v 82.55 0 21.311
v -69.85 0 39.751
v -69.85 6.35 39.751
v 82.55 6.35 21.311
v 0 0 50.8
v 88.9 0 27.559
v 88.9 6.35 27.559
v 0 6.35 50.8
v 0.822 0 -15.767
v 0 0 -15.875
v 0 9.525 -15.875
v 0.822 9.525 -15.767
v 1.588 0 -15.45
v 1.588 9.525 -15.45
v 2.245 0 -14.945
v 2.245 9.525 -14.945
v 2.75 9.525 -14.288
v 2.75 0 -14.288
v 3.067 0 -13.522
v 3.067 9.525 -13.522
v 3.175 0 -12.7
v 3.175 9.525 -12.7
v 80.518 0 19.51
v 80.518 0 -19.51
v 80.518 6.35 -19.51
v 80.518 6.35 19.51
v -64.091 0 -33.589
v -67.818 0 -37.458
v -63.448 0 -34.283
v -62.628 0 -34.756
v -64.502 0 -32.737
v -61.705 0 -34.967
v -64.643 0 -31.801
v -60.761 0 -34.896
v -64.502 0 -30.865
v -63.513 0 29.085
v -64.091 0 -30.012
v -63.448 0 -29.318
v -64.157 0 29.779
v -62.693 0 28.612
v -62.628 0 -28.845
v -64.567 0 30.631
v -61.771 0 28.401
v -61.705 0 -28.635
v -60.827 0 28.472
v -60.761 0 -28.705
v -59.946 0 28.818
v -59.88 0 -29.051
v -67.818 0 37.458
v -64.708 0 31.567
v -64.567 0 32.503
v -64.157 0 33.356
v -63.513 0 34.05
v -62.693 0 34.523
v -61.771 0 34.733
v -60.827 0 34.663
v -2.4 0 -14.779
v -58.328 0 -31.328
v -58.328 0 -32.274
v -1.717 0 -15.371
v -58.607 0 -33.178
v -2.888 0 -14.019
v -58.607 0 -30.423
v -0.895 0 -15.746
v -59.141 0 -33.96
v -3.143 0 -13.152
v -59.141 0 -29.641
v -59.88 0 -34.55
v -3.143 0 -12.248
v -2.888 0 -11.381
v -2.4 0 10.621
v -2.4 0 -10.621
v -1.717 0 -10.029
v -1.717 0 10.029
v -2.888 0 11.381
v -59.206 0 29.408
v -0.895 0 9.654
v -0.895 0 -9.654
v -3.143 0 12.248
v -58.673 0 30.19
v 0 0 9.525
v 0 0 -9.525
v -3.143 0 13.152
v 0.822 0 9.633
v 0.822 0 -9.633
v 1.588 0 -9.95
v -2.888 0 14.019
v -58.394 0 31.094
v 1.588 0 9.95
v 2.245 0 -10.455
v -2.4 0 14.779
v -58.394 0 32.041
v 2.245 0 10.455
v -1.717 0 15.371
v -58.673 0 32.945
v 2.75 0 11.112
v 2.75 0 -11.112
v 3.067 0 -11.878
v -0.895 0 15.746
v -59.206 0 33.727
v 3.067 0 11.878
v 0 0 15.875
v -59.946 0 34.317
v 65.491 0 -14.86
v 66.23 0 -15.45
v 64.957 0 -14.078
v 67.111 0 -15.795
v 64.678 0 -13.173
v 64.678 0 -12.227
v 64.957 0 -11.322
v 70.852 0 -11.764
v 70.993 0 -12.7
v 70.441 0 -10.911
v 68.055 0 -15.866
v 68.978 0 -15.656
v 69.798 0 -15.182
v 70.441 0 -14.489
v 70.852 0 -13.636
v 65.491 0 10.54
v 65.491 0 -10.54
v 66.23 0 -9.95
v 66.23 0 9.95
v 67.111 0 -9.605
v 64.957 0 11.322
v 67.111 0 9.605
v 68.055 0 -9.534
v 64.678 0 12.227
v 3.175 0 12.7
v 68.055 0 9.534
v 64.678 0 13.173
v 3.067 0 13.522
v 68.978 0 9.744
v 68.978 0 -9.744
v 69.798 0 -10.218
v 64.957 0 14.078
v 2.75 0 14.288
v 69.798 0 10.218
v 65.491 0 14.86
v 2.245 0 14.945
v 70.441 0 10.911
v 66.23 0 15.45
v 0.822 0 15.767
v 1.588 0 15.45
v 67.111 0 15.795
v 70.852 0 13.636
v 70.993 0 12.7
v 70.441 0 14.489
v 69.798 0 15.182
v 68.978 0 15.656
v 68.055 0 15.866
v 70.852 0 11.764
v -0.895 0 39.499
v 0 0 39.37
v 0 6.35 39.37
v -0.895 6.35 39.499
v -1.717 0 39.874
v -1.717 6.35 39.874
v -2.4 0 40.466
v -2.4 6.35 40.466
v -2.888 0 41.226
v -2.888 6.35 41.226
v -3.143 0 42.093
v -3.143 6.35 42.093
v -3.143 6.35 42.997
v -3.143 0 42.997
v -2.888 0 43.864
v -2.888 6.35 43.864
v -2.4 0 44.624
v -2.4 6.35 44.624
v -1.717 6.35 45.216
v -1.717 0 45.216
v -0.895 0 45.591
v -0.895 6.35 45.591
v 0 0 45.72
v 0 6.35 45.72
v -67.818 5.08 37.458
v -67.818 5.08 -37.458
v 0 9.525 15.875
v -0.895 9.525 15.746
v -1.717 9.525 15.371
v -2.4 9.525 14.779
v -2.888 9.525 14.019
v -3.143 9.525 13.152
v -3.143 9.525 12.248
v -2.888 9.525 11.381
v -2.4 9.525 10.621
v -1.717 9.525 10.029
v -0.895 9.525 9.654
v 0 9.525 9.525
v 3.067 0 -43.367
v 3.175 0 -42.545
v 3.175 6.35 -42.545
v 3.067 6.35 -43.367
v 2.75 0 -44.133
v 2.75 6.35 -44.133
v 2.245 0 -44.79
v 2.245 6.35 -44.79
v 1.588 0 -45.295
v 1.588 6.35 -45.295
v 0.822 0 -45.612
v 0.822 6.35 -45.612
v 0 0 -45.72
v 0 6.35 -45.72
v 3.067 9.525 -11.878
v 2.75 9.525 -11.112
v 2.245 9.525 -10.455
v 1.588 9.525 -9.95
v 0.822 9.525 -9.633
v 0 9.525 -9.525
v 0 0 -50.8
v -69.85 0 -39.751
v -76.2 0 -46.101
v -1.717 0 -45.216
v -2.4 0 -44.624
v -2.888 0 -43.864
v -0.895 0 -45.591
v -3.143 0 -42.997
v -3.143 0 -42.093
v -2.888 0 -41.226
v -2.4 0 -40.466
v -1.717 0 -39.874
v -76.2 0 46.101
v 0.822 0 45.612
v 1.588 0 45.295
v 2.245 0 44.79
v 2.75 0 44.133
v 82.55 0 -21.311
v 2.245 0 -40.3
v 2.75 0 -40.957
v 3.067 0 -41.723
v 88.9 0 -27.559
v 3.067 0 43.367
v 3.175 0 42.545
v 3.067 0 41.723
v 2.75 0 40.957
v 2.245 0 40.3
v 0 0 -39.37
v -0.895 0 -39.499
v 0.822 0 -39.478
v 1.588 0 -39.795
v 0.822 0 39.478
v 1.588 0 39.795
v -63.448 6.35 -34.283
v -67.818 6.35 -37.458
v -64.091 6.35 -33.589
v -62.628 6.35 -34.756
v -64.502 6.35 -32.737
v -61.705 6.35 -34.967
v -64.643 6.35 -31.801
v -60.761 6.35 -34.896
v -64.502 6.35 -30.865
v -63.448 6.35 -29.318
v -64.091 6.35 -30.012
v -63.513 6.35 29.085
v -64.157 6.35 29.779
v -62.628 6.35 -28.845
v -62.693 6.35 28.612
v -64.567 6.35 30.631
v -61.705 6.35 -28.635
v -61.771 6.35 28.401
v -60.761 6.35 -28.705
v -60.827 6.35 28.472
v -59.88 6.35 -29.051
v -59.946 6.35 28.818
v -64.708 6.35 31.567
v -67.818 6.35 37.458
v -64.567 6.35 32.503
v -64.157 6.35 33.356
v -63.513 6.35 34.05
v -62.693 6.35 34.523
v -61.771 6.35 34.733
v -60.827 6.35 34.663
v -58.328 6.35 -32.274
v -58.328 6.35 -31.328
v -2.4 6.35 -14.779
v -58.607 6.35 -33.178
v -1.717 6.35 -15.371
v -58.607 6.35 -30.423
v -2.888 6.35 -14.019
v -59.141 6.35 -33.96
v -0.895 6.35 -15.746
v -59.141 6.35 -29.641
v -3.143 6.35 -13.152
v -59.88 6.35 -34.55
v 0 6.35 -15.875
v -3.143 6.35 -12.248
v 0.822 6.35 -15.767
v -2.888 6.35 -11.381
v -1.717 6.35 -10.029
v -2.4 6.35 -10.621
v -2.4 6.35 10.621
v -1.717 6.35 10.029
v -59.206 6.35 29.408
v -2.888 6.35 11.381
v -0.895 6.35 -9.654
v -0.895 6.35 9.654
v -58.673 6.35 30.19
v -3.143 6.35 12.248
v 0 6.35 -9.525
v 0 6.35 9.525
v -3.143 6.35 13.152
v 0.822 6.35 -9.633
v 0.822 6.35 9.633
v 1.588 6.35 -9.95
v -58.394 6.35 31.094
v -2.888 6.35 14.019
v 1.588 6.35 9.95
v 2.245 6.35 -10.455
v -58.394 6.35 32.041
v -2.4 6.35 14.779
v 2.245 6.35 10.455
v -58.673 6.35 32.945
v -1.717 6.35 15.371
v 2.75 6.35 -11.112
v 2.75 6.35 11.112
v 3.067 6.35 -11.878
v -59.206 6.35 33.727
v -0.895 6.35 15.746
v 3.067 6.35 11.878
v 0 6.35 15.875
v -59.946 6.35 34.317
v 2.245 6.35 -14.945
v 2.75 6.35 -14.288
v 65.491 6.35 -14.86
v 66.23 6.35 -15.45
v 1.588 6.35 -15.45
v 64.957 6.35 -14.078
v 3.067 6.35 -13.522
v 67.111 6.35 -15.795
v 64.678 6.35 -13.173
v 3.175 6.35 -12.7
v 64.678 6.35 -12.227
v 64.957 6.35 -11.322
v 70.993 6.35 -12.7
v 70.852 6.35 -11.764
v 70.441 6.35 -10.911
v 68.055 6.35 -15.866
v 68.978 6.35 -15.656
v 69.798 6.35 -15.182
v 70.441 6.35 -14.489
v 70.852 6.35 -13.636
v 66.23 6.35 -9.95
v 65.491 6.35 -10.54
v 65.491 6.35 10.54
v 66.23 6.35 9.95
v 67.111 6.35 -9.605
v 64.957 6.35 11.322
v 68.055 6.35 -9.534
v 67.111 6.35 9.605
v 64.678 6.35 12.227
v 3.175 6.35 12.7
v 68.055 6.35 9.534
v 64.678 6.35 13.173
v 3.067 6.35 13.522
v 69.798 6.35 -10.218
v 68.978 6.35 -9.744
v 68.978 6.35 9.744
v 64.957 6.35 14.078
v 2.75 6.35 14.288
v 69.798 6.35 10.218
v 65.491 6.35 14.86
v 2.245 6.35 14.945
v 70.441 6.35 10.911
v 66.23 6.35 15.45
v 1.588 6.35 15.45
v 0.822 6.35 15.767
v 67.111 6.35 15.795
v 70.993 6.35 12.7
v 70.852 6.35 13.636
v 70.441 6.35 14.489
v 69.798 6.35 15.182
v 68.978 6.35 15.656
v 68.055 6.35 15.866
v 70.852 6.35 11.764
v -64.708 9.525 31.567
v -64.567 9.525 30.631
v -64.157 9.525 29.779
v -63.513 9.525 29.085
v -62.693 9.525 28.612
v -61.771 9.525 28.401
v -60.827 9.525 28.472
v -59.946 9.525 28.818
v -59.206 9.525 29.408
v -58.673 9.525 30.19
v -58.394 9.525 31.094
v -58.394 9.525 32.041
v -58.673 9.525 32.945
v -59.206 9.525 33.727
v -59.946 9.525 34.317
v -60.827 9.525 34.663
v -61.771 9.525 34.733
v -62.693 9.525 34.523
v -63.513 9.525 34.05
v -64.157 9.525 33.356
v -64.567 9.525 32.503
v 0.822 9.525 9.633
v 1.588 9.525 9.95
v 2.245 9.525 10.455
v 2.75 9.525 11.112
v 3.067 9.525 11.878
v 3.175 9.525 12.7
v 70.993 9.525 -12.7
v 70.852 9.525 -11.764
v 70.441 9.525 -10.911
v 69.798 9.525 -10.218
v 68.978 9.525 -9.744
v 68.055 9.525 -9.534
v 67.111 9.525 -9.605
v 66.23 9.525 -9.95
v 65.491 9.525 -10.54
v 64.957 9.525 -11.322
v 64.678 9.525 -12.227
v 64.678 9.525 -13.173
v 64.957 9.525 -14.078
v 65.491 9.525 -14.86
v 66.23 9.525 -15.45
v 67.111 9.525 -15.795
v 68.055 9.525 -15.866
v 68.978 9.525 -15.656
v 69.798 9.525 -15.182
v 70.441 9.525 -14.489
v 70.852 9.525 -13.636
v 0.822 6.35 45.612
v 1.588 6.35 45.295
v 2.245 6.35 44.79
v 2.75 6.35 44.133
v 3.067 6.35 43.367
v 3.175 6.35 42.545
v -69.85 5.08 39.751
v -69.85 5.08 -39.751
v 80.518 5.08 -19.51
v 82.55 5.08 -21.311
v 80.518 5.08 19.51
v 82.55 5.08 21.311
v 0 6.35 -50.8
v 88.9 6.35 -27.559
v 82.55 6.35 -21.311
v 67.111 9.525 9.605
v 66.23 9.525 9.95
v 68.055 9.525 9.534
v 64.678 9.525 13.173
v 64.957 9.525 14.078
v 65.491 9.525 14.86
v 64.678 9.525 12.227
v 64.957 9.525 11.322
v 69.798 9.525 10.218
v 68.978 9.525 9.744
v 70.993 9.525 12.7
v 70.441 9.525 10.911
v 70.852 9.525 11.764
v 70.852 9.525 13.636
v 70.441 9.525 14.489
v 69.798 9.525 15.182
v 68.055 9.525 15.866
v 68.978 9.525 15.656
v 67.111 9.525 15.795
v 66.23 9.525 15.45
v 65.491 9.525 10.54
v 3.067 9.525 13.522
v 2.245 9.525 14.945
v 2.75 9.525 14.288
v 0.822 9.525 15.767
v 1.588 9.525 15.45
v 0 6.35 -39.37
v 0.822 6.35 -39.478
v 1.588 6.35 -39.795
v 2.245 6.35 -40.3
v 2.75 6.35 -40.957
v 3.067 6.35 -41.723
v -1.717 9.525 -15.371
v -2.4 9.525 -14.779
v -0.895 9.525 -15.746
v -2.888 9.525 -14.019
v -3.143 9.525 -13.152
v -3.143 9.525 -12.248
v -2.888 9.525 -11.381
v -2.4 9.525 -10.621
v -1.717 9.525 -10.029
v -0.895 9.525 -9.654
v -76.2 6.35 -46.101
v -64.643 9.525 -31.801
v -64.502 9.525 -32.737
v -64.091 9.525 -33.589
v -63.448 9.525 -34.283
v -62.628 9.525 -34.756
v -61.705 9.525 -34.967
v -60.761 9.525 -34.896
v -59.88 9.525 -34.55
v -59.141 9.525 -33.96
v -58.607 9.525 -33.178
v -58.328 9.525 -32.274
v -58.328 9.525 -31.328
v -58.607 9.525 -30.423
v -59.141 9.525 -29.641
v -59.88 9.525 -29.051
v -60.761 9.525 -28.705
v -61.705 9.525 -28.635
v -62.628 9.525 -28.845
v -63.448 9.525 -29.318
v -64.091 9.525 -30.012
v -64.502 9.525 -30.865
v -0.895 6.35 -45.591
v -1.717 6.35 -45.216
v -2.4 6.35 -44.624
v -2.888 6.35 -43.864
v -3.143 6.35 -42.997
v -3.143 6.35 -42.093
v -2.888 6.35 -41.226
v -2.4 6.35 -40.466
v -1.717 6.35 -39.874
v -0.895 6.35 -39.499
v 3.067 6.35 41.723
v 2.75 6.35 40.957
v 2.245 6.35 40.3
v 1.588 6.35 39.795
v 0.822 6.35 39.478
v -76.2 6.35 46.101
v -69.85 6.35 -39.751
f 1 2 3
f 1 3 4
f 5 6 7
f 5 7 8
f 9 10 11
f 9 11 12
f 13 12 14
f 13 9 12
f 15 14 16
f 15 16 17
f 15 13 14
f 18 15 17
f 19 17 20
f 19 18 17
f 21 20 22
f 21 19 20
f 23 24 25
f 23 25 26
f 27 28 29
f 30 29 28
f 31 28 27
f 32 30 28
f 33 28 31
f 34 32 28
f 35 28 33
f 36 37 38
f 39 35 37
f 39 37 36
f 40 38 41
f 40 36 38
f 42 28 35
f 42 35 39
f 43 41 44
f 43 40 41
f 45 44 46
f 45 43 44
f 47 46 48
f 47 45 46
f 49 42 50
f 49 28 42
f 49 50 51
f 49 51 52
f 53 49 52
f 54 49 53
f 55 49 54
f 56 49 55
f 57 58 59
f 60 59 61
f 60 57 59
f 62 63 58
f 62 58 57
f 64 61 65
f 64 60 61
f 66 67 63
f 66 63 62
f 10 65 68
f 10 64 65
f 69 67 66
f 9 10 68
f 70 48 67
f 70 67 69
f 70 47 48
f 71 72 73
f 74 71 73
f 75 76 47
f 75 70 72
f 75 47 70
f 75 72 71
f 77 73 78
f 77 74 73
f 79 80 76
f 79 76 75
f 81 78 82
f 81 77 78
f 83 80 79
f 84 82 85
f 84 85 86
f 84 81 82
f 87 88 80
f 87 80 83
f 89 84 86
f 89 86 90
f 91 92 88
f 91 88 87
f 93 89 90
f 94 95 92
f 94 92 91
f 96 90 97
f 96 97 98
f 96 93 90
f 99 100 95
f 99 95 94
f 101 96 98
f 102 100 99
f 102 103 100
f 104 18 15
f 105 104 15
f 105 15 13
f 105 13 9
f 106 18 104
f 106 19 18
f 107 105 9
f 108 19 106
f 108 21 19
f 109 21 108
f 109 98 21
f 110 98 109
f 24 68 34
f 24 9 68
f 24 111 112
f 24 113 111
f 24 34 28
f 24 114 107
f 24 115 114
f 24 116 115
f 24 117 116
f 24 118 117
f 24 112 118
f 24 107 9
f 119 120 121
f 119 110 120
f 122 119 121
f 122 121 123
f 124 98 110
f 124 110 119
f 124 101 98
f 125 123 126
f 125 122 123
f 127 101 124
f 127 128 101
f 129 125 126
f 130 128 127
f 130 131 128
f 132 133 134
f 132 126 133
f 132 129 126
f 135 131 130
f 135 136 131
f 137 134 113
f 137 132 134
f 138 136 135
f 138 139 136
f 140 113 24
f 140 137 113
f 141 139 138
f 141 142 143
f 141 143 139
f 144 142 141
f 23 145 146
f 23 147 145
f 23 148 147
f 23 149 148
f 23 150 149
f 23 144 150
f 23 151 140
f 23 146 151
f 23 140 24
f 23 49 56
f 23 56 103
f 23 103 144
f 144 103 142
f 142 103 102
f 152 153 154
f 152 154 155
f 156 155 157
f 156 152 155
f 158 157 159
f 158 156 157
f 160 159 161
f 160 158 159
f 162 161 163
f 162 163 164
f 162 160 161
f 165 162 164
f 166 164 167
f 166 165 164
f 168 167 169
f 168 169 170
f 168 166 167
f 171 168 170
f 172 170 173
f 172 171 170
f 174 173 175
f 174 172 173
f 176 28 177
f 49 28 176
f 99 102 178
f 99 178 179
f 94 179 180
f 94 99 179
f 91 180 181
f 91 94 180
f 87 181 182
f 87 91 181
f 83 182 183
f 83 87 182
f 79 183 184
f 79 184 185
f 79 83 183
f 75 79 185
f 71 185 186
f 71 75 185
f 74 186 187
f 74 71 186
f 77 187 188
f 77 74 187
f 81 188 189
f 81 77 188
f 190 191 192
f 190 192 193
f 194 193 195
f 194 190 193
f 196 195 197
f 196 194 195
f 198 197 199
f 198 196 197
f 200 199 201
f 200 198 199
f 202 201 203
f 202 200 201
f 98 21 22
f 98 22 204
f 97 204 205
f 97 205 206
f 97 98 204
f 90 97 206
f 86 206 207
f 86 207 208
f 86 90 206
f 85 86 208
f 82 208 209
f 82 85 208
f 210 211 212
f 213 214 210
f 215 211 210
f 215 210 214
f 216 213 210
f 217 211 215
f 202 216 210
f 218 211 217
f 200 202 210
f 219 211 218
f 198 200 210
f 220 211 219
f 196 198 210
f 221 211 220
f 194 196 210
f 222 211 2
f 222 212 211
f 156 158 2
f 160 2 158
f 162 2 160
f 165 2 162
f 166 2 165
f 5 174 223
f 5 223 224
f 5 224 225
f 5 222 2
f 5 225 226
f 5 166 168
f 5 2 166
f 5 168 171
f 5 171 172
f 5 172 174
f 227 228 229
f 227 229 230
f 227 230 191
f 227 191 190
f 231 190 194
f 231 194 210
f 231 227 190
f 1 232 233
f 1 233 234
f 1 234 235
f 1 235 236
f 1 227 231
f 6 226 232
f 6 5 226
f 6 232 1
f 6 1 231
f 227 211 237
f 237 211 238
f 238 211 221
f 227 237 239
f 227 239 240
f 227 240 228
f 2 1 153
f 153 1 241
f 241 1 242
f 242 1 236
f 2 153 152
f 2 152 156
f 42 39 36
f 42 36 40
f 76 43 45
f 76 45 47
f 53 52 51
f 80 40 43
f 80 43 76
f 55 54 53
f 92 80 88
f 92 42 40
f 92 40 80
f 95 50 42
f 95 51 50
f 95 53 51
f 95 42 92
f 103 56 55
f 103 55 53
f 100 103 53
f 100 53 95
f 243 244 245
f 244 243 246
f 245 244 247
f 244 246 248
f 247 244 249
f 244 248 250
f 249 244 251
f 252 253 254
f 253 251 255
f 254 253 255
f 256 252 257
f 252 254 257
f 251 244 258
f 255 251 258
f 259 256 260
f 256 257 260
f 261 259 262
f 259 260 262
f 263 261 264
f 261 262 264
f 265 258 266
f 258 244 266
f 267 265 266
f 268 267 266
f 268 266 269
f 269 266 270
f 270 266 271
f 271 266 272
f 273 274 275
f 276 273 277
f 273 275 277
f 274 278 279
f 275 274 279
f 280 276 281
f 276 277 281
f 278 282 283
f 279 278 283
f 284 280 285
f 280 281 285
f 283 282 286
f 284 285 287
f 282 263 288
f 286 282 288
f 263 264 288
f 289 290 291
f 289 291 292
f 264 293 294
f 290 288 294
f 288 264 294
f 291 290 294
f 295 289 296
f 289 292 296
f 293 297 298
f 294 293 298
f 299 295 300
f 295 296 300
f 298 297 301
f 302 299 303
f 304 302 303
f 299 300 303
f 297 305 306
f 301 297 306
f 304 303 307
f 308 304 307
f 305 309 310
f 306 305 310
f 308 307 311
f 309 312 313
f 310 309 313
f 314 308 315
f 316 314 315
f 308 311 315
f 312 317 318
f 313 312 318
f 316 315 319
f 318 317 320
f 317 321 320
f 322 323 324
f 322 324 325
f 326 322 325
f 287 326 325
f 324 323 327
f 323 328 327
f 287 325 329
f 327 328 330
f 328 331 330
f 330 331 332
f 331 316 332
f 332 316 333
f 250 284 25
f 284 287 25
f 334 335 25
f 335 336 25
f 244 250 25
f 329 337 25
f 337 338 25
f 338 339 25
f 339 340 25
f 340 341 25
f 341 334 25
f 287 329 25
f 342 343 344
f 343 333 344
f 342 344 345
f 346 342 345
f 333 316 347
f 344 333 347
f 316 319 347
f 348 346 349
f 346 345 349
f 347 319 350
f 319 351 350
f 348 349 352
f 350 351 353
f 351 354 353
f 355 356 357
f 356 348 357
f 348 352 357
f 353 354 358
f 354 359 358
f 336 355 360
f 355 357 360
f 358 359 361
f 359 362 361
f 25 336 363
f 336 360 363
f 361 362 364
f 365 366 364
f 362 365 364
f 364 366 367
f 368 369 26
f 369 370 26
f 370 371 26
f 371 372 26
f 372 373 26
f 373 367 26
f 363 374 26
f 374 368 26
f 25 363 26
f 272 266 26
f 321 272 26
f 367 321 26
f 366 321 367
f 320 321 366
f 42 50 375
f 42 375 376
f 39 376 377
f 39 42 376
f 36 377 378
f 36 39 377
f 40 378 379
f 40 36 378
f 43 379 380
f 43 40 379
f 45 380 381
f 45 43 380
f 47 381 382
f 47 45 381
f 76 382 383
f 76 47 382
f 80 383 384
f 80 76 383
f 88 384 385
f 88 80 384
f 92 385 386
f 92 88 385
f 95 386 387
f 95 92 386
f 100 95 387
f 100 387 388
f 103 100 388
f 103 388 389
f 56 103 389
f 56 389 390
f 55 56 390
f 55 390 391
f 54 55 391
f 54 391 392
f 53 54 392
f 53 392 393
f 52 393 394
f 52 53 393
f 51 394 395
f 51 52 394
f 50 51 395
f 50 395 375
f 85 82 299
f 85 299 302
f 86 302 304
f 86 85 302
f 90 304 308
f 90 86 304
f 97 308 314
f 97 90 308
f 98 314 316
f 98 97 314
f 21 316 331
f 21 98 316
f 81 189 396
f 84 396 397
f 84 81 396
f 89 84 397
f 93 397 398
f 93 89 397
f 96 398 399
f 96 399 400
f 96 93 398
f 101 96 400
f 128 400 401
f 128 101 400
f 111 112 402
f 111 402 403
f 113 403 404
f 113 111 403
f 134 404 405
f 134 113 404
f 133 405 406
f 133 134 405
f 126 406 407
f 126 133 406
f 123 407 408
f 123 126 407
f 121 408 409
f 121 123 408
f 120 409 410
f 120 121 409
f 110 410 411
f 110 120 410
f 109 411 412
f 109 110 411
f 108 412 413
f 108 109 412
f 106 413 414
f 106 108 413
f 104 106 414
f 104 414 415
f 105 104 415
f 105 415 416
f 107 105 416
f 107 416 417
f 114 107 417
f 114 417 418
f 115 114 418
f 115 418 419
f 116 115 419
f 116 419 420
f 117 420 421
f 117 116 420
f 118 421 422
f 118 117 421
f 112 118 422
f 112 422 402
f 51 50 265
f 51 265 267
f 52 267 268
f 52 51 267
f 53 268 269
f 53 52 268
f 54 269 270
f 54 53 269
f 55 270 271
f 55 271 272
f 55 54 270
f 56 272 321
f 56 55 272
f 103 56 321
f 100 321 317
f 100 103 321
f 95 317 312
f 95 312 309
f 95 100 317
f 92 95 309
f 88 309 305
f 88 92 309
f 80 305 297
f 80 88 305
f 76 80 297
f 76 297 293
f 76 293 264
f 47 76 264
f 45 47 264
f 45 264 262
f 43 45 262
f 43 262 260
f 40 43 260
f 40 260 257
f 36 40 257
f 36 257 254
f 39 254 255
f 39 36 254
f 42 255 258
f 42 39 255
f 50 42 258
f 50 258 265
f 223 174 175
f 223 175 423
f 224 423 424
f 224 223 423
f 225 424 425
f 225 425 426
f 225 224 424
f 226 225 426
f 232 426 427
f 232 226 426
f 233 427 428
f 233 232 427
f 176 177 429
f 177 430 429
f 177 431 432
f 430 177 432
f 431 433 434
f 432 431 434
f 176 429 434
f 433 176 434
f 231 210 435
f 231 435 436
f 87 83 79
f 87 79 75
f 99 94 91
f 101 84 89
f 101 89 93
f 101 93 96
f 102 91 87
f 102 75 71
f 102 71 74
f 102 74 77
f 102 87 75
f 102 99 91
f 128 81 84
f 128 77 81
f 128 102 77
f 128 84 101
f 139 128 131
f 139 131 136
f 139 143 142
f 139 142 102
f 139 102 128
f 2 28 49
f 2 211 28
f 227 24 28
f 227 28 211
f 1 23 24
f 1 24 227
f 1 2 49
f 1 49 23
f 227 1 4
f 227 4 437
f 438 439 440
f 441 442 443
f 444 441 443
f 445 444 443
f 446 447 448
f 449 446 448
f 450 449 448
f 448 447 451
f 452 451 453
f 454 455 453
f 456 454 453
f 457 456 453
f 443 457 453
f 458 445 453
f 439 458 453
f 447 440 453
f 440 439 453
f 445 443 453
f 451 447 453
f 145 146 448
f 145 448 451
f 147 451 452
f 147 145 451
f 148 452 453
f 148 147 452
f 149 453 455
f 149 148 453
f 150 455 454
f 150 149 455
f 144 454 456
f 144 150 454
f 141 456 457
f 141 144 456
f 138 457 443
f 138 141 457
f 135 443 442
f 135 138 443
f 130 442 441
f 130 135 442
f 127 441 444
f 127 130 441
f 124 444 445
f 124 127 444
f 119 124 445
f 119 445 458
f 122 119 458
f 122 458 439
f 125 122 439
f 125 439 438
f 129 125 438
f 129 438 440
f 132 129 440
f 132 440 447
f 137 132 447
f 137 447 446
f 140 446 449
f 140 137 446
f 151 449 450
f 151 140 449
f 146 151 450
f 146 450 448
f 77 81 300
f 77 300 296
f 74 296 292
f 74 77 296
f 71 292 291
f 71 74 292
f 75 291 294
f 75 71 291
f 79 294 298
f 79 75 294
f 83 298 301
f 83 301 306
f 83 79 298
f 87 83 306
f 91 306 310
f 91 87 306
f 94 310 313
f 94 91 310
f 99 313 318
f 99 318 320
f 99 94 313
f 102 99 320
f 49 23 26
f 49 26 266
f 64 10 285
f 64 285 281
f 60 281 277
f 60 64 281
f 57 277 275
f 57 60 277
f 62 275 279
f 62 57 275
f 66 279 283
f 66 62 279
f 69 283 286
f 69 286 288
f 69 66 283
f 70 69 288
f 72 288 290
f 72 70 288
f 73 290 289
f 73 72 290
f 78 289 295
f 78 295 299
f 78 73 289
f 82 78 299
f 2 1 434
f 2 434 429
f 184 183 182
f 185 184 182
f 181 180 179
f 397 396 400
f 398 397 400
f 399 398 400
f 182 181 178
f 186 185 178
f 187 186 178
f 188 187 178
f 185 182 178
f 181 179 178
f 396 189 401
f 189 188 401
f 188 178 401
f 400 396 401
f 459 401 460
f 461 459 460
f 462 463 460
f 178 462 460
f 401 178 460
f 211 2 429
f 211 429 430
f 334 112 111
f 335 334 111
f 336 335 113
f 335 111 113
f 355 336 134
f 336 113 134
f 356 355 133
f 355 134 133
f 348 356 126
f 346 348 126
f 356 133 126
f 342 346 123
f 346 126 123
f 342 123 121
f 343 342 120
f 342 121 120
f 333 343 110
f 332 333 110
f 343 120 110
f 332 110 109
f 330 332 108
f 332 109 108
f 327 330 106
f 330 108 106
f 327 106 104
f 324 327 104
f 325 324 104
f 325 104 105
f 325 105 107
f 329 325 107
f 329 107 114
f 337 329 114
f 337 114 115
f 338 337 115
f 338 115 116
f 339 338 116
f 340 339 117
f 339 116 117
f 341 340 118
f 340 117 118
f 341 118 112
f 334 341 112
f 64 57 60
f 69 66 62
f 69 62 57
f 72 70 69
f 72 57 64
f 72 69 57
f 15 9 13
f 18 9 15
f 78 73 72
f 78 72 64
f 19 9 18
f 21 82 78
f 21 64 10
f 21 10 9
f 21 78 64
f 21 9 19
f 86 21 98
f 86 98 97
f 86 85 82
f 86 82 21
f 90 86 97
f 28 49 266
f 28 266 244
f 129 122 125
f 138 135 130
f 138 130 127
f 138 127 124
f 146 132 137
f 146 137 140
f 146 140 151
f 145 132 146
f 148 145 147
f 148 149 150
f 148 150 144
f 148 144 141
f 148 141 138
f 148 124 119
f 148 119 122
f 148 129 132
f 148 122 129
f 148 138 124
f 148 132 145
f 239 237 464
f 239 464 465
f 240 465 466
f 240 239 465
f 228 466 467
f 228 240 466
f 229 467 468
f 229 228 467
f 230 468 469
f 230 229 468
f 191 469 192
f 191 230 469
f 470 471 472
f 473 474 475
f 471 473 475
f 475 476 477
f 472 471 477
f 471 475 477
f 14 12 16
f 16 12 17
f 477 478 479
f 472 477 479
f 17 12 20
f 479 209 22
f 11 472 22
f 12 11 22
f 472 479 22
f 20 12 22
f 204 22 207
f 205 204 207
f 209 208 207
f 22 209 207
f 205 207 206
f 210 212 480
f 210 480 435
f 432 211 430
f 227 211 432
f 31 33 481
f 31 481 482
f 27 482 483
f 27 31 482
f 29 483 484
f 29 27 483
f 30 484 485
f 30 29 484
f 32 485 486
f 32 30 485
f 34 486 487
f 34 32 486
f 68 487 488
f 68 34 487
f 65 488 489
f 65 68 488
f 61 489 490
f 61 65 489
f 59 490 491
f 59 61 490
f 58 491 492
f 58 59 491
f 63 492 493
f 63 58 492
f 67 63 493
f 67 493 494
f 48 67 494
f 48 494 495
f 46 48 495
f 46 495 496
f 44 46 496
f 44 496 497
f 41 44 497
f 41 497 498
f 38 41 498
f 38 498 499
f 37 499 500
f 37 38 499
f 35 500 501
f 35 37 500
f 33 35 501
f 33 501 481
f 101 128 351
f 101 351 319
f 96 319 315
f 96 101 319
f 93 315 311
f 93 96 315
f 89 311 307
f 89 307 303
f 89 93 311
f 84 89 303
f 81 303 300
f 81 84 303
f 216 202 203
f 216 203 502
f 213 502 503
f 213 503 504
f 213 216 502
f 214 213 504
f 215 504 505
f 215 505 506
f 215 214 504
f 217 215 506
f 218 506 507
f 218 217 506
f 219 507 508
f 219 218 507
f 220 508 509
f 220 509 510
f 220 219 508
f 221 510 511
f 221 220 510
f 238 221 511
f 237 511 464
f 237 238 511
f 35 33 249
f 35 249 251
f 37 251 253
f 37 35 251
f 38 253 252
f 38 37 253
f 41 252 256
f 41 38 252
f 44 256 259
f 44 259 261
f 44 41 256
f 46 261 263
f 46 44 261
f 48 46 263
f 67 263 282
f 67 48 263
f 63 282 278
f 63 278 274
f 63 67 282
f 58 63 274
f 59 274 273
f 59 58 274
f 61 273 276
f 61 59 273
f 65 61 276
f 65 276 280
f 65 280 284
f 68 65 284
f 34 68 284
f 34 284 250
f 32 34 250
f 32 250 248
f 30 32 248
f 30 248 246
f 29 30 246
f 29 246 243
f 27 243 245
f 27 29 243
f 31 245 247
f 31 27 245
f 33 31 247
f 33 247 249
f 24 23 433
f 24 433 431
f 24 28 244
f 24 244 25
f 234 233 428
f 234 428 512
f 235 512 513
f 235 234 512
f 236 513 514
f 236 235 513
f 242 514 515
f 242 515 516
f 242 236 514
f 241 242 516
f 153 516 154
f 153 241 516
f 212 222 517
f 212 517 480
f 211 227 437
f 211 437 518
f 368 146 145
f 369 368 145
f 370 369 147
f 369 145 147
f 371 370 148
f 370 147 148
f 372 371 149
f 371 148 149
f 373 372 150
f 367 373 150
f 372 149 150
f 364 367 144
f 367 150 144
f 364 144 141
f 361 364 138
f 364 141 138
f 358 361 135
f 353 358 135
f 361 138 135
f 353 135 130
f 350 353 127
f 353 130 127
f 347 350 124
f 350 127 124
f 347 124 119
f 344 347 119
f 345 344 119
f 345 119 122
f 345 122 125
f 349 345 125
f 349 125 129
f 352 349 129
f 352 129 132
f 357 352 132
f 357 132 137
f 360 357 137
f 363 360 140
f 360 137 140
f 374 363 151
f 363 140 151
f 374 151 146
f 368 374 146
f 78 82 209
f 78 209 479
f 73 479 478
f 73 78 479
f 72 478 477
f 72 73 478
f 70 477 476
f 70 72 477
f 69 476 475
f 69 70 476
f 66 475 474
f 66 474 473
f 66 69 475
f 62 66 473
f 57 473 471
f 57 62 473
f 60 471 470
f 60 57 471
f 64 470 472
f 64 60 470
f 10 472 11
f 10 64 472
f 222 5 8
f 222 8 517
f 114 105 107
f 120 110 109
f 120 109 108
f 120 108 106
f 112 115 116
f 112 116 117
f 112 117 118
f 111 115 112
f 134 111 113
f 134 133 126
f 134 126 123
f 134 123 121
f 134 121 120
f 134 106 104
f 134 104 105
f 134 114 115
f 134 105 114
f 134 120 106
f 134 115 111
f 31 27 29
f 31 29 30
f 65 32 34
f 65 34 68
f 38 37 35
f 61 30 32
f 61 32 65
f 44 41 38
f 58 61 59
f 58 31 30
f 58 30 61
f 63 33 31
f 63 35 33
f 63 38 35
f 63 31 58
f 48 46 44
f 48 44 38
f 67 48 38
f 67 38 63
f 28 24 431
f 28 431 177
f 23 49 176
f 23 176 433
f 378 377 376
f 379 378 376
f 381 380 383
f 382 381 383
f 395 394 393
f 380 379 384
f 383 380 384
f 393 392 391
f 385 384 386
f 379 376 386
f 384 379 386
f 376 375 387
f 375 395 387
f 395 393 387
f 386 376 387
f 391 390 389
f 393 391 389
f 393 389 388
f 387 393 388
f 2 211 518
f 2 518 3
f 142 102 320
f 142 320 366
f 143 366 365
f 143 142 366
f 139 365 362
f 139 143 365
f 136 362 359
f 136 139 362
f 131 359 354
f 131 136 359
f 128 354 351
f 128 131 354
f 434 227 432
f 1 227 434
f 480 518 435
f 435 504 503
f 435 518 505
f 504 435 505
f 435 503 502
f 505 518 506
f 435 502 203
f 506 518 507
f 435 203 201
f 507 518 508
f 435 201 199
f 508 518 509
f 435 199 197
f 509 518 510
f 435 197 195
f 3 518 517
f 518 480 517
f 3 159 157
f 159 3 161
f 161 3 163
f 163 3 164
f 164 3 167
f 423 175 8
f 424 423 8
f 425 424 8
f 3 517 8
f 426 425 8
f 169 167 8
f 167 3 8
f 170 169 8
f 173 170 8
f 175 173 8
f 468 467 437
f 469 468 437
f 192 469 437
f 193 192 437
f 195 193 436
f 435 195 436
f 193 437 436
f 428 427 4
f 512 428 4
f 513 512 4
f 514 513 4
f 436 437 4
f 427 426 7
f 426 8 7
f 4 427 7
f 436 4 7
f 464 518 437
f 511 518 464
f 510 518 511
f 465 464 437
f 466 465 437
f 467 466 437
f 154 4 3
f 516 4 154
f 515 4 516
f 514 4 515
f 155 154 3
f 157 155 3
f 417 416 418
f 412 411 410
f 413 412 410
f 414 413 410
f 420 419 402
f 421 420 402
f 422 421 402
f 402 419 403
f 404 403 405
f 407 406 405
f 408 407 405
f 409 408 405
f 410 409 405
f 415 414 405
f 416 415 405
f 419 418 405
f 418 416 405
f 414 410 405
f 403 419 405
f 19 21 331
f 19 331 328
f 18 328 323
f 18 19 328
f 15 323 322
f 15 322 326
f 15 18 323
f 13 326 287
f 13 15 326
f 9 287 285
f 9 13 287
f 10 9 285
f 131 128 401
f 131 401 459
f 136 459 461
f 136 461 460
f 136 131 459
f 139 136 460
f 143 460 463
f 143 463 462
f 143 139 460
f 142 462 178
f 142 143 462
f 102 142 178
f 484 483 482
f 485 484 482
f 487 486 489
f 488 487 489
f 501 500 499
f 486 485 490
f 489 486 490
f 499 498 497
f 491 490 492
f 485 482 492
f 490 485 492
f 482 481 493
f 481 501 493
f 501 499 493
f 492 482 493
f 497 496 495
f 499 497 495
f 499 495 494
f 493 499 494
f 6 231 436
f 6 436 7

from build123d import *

# Parameters (mm, degrees)
F0_R     = 3.175
F1_DEPTH = 6.35
F2_DEPTH = 6.35
F3_DEPTH = 5.08
F4_DEPTH = 9.525


with BuildPart() as f1:
    # F0 (on Front) → F1 (new body)
    with BuildSketch(Plane.XZ):
        with BuildLine():
            Line((0, 9.525), (0, 0))
            Line((0, 0), (80.518, 0))
            Line((80.518, 0), (80.518, 19.5096507962))
            Line((80.518, 19.5096507962), (0, 29.2523287962))
            Line((0, 29.2523287962), (0, 15.875))
            ThreePointArc((0, 15.875), (2.2450640303, 14.9450640303), (3.175, 12.7))
            ThreePointArc((3.175, 12.7), (2.2450640303, 10.4549359697), (0, 9.525))
        make_face()
        with Locations((67.818, 12.7)):
            Circle(F0_R, mode=Mode.SUBTRACT)
        with BuildLine():
            Line((-67.818, 0), (0, 0))
            Line((0, 0), (0, 9.525))
            ThreePointArc((0, 9.525), (-3.175, 12.7), (0, 15.875))
            Line((0, 15.875), (0, 29.2523287962))
            Line((0, 29.2523287962), (-67.818, 37.4583067962))
            Line((-67.818, 37.4583067962), (-67.818, 31.567312777))
            Line((-67.818, 31.567312777), (-67.818, 0))
        make_face()
        with BuildLine():
            ThreePointArc((-58.3583989263, 31.567312777), (-61.5333989263, 28.392312777), (-64.7083989263, 31.567312777))
            ThreePointArc((-64.7083989263, 31.567312777), (-61.5333989263, 34.742312777), (-58.3583989263, 31.567312777))
        make_face(mode=Mode.SUBTRACT)
        with BuildLine():
            Line((0, -9.525), (0, 0))
            Line((0, 0), (-67.818, 0))
            Line((-67.818, 0), (-67.818, -31.8008))
            Line((-67.818, -31.8008), (-67.818, -37.4583067962))
            Line((-67.818, -37.4583067962), (0, -29.2523287962))
            Line((0, -29.2523287962), (0, -15.875))
            ThreePointArc((0, -15.875), (-3.175, -12.7), (0, -9.525))
        make_face()
        with BuildLine():
            ThreePointArc((-58.293, -31.8008), (-61.468, -34.9758), (-64.643, -31.8008))
            ThreePointArc((-64.643, -31.8008), (-61.468, -28.6258), (-58.293, -31.8008))
        make_face(mode=Mode.SUBTRACT)
        with BuildLine():
            Line((80.518, 0), (0, 0))
            Line((0, 0), (0, -9.525))
            ThreePointArc((0, -9.525), (2.2450640303, -10.4549359697), (3.175, -12.7))
            ThreePointArc((3.175, -12.7), (2.2450640303, -14.9450640303), (0, -15.875))
            Line((0, -15.875), (0, -29.2523287962))
            Line((0, -29.2523287962), (80.518, -19.5096507962))
            Line((80.518, -19.5096507962), (80.518, 0))
        make_face()
        with Locations((67.818, -12.7)):
            Circle(F0_R, mode=Mode.SUBTRACT)
    extrude(amount=-F1_DEPTH)


with BuildPart() as f2:
    # F0 (on Front) → F2 (new body)
    with BuildSketch(Plane.XZ):
        with BuildLine():
            Line((82.55, 21.3106), (82.55, 0))
            Line((82.55, 0), (88.9, 0))
            Line((88.9, 0), (88.9, 27.559))
            Line((88.9, 27.559), (0, 50.8))
            Line((0, 50.8), (0, 45.72))
            ThreePointArc((0, 45.72), (2.2450640303, 44.7900640303), (3.175, 42.545))
            ThreePointArc((3.175, 42.545), (2.2450640303, 40.2999359697), (0, 39.37))
            Line((0, 39.37), (0, 31.29915))
            Line((0, 31.29915), (82.55, 21.3106))
        make_face()
        with BuildLine():
            Line((88.9, 0), (82.55, 0))
            Line((82.55, 0), (82.55, -21.3106))
            Line((82.55, -21.3106), (0, -31.29915))
            Line((0, -31.29915), (0, -39.37))
            ThreePointArc((0, -39.37), (2.2450640303, -40.2999359697), (3.175, -42.545))
            ThreePointArc((3.175, -42.545), (2.2450640303, -44.7900640303), (0, -45.72))
            Line((0, -45.72), (0, -50.8))
            Line((0, -50.8), (88.9, -27.559))
            Line((88.9, -27.559), (88.9, 0))
        make_face()
        with BuildLine():
            Line((-69.85, -37.7041787962), (-69.85, 0))
            Line((-69.85, 0), (-76.2, 0))
            Line((-76.2, 0), (-76.2, -46.101))
            Line((-76.2, -46.101), (0, -50.8))
            Line((0, -50.8), (0, -45.72))
            ThreePointArc((0, -45.72), (-3.175, -42.545), (0, -39.37))
            Line((0, -39.37), (0, -31.29915))
            Line((0, -31.29915), (-67.818, -39.505128))
            Line((-67.818, -39.505128), (-69.85, -39.751))
            Line((-69.85, -39.751), (-69.85, -37.7041787962))
        make_face()
        with BuildLine():
            Line((-76.2, 0), (-69.85, 0))
            Line((-69.85, 0), (-69.85, 37.7041787962))
            Line((-69.85, 37.7041787962), (-69.85, 39.751))
            Line((-69.85, 39.751), (-67.818, 39.505128))
            Line((-67.818, 39.505128), (0, 31.29915))
            Line((0, 31.29915), (0, 39.37))
            ThreePointArc((0, 39.37), (-3.175, 42.545), (0, 45.72))
            Line((0, 45.72), (0, 50.8))
            Line((0, 50.8), (-76.2, 46.101))
            Line((-76.2, 46.101), (-76.2, 0))
        make_face()
    extrude(amount=-F2_DEPTH)


with BuildPart() as f3:
    # F0 (on Front) → F3 (new body)
    with BuildSketch(Plane.XZ):
        Polygon((80.518, 19.5096507962), (80.518, 0), (82.55, 0), (82.55, 21.3106), (0, 31.29915), (0, 29.2523287962), align=None)
        Polygon((-67.818, 37.4583067962), (0, 29.2523287962), (0, 31.29915), (-67.818, 39.505128), align=None)
        Polygon((-69.85, 0), (-67.818, 0), (-67.818, 31.567312777), (-67.818, 37.4583067962), (-69.85, 37.7041787962), align=None)
        Polygon((-69.85, 39.751), (-69.85, 37.7041787962), (-67.818, 37.4583067962), (-67.818, 39.505128), align=None)
        Polygon((-67.818, -31.8008), (-67.818, 0), (-69.85, 0), (-69.85, -37.7041787962), (-67.818, -37.4583067962), align=None)
        Polygon((-67.818, -37.4583067962), (-69.85, -37.7041787962), (-69.85, -39.751), (-67.818, -39.505128), align=None)
        Polygon((0, -31.29915), (0, -29.2523287962), (-67.818, -37.4583067962), (-67.818, -39.505128), align=None)
        Polygon((82.55, 0), (80.518, 0), (80.518, -19.5096507962), (0, -29.2523287962), (0, -31.29915), (82.55, -21.3106), align=None)
    extrude(amount=-F3_DEPTH)


with BuildPart() as f4:
    # F0 (on Front) → F4 (new body)
    with BuildSketch(Plane.XZ):
        with BuildLine():
            ThreePointArc((-58.3583989263, 31.567312777), (-61.5333989263, 34.742312777), (-64.7083989263, 31.567312777))
            ThreePointArc((-64.7083989263, 31.567312777), (-61.5333989263, 28.392312777), (-58.3583989263, 31.567312777))
        make_face()
    extrude(amount=-F4_DEPTH)


with BuildPart() as f4b:
    # F0 (on Front) → F4, piece 2 (new body)
    with BuildSketch(Plane.XZ):
        with BuildLine():
            ThreePointArc((-58.293, -31.8008), (-61.468, -28.6258), (-64.643, -31.8008))
            ThreePointArc((-64.643, -31.8008), (-61.468, -34.9758), (-58.293, -31.8008))
        make_face()
    extrude(amount=-F4_DEPTH)


with BuildPart() as f4c:
    # F0 (on Front) → F4, piece 3 (new body)
    with BuildSketch(Plane.XZ):
        with Locations((67.818, -12.7)):
            Circle(F0_R)
    extrude(amount=-F4_DEPTH)


with BuildPart() as f4d:
    # F0 (on Front) → F4, piece 4 (new body)
    with BuildSketch(Plane.XZ):
        with BuildLine():
            Line((0, -15.875), (0, -9.525))
            ThreePointArc((0, -9.525), (-3.175, -12.7), (0, -15.875))
        make_face()
        with BuildLine():
            ThreePointArc((3.175, -12.7), (2.2450640303, -10.4549359697), (0, -9.525))
            Line((0, -9.525), (0, -15.875))
            ThreePointArc((0, -15.875), (2.2450640303, -14.9450640303), (3.175, -12.7))
        make_face()
    extrude(amount=-F4_DEPTH)


with BuildPart() as f4e:
    # F0 (on Front) → F4, piece 5 (new body)
    with BuildSketch(Plane.XZ):
        with BuildLine():
            Line((0, 15.875), (0, 9.525))
            ThreePointArc((0, 9.525), (2.2450640303, 10.4549359697), (3.175, 12.7))
            ThreePointArc((3.175, 12.7), (2.2450640303, 14.9450640303), (0, 15.875))
        make_face()
        with BuildLine():
            ThreePointArc((0, 15.875), (-3.175, 12.7), (0, 9.525))
            Line((0, 9.525), (0, 15.875))
        make_face()
    extrude(amount=-F4_DEPTH)


with BuildPart() as f4f:
    # F0 (on Front) → F4, piece 6 (new body)
    with BuildSketch(Plane.XZ):
        with Locations((67.818, 12.7)):
            Circle(F0_R)
    extrude(amount=-F4_DEPTH)


solid = Compound([f1.part, f2.part, f3.part, f4.part, f4b.part, f4c.part, f4d.part, f4e.part, f4f.part])
